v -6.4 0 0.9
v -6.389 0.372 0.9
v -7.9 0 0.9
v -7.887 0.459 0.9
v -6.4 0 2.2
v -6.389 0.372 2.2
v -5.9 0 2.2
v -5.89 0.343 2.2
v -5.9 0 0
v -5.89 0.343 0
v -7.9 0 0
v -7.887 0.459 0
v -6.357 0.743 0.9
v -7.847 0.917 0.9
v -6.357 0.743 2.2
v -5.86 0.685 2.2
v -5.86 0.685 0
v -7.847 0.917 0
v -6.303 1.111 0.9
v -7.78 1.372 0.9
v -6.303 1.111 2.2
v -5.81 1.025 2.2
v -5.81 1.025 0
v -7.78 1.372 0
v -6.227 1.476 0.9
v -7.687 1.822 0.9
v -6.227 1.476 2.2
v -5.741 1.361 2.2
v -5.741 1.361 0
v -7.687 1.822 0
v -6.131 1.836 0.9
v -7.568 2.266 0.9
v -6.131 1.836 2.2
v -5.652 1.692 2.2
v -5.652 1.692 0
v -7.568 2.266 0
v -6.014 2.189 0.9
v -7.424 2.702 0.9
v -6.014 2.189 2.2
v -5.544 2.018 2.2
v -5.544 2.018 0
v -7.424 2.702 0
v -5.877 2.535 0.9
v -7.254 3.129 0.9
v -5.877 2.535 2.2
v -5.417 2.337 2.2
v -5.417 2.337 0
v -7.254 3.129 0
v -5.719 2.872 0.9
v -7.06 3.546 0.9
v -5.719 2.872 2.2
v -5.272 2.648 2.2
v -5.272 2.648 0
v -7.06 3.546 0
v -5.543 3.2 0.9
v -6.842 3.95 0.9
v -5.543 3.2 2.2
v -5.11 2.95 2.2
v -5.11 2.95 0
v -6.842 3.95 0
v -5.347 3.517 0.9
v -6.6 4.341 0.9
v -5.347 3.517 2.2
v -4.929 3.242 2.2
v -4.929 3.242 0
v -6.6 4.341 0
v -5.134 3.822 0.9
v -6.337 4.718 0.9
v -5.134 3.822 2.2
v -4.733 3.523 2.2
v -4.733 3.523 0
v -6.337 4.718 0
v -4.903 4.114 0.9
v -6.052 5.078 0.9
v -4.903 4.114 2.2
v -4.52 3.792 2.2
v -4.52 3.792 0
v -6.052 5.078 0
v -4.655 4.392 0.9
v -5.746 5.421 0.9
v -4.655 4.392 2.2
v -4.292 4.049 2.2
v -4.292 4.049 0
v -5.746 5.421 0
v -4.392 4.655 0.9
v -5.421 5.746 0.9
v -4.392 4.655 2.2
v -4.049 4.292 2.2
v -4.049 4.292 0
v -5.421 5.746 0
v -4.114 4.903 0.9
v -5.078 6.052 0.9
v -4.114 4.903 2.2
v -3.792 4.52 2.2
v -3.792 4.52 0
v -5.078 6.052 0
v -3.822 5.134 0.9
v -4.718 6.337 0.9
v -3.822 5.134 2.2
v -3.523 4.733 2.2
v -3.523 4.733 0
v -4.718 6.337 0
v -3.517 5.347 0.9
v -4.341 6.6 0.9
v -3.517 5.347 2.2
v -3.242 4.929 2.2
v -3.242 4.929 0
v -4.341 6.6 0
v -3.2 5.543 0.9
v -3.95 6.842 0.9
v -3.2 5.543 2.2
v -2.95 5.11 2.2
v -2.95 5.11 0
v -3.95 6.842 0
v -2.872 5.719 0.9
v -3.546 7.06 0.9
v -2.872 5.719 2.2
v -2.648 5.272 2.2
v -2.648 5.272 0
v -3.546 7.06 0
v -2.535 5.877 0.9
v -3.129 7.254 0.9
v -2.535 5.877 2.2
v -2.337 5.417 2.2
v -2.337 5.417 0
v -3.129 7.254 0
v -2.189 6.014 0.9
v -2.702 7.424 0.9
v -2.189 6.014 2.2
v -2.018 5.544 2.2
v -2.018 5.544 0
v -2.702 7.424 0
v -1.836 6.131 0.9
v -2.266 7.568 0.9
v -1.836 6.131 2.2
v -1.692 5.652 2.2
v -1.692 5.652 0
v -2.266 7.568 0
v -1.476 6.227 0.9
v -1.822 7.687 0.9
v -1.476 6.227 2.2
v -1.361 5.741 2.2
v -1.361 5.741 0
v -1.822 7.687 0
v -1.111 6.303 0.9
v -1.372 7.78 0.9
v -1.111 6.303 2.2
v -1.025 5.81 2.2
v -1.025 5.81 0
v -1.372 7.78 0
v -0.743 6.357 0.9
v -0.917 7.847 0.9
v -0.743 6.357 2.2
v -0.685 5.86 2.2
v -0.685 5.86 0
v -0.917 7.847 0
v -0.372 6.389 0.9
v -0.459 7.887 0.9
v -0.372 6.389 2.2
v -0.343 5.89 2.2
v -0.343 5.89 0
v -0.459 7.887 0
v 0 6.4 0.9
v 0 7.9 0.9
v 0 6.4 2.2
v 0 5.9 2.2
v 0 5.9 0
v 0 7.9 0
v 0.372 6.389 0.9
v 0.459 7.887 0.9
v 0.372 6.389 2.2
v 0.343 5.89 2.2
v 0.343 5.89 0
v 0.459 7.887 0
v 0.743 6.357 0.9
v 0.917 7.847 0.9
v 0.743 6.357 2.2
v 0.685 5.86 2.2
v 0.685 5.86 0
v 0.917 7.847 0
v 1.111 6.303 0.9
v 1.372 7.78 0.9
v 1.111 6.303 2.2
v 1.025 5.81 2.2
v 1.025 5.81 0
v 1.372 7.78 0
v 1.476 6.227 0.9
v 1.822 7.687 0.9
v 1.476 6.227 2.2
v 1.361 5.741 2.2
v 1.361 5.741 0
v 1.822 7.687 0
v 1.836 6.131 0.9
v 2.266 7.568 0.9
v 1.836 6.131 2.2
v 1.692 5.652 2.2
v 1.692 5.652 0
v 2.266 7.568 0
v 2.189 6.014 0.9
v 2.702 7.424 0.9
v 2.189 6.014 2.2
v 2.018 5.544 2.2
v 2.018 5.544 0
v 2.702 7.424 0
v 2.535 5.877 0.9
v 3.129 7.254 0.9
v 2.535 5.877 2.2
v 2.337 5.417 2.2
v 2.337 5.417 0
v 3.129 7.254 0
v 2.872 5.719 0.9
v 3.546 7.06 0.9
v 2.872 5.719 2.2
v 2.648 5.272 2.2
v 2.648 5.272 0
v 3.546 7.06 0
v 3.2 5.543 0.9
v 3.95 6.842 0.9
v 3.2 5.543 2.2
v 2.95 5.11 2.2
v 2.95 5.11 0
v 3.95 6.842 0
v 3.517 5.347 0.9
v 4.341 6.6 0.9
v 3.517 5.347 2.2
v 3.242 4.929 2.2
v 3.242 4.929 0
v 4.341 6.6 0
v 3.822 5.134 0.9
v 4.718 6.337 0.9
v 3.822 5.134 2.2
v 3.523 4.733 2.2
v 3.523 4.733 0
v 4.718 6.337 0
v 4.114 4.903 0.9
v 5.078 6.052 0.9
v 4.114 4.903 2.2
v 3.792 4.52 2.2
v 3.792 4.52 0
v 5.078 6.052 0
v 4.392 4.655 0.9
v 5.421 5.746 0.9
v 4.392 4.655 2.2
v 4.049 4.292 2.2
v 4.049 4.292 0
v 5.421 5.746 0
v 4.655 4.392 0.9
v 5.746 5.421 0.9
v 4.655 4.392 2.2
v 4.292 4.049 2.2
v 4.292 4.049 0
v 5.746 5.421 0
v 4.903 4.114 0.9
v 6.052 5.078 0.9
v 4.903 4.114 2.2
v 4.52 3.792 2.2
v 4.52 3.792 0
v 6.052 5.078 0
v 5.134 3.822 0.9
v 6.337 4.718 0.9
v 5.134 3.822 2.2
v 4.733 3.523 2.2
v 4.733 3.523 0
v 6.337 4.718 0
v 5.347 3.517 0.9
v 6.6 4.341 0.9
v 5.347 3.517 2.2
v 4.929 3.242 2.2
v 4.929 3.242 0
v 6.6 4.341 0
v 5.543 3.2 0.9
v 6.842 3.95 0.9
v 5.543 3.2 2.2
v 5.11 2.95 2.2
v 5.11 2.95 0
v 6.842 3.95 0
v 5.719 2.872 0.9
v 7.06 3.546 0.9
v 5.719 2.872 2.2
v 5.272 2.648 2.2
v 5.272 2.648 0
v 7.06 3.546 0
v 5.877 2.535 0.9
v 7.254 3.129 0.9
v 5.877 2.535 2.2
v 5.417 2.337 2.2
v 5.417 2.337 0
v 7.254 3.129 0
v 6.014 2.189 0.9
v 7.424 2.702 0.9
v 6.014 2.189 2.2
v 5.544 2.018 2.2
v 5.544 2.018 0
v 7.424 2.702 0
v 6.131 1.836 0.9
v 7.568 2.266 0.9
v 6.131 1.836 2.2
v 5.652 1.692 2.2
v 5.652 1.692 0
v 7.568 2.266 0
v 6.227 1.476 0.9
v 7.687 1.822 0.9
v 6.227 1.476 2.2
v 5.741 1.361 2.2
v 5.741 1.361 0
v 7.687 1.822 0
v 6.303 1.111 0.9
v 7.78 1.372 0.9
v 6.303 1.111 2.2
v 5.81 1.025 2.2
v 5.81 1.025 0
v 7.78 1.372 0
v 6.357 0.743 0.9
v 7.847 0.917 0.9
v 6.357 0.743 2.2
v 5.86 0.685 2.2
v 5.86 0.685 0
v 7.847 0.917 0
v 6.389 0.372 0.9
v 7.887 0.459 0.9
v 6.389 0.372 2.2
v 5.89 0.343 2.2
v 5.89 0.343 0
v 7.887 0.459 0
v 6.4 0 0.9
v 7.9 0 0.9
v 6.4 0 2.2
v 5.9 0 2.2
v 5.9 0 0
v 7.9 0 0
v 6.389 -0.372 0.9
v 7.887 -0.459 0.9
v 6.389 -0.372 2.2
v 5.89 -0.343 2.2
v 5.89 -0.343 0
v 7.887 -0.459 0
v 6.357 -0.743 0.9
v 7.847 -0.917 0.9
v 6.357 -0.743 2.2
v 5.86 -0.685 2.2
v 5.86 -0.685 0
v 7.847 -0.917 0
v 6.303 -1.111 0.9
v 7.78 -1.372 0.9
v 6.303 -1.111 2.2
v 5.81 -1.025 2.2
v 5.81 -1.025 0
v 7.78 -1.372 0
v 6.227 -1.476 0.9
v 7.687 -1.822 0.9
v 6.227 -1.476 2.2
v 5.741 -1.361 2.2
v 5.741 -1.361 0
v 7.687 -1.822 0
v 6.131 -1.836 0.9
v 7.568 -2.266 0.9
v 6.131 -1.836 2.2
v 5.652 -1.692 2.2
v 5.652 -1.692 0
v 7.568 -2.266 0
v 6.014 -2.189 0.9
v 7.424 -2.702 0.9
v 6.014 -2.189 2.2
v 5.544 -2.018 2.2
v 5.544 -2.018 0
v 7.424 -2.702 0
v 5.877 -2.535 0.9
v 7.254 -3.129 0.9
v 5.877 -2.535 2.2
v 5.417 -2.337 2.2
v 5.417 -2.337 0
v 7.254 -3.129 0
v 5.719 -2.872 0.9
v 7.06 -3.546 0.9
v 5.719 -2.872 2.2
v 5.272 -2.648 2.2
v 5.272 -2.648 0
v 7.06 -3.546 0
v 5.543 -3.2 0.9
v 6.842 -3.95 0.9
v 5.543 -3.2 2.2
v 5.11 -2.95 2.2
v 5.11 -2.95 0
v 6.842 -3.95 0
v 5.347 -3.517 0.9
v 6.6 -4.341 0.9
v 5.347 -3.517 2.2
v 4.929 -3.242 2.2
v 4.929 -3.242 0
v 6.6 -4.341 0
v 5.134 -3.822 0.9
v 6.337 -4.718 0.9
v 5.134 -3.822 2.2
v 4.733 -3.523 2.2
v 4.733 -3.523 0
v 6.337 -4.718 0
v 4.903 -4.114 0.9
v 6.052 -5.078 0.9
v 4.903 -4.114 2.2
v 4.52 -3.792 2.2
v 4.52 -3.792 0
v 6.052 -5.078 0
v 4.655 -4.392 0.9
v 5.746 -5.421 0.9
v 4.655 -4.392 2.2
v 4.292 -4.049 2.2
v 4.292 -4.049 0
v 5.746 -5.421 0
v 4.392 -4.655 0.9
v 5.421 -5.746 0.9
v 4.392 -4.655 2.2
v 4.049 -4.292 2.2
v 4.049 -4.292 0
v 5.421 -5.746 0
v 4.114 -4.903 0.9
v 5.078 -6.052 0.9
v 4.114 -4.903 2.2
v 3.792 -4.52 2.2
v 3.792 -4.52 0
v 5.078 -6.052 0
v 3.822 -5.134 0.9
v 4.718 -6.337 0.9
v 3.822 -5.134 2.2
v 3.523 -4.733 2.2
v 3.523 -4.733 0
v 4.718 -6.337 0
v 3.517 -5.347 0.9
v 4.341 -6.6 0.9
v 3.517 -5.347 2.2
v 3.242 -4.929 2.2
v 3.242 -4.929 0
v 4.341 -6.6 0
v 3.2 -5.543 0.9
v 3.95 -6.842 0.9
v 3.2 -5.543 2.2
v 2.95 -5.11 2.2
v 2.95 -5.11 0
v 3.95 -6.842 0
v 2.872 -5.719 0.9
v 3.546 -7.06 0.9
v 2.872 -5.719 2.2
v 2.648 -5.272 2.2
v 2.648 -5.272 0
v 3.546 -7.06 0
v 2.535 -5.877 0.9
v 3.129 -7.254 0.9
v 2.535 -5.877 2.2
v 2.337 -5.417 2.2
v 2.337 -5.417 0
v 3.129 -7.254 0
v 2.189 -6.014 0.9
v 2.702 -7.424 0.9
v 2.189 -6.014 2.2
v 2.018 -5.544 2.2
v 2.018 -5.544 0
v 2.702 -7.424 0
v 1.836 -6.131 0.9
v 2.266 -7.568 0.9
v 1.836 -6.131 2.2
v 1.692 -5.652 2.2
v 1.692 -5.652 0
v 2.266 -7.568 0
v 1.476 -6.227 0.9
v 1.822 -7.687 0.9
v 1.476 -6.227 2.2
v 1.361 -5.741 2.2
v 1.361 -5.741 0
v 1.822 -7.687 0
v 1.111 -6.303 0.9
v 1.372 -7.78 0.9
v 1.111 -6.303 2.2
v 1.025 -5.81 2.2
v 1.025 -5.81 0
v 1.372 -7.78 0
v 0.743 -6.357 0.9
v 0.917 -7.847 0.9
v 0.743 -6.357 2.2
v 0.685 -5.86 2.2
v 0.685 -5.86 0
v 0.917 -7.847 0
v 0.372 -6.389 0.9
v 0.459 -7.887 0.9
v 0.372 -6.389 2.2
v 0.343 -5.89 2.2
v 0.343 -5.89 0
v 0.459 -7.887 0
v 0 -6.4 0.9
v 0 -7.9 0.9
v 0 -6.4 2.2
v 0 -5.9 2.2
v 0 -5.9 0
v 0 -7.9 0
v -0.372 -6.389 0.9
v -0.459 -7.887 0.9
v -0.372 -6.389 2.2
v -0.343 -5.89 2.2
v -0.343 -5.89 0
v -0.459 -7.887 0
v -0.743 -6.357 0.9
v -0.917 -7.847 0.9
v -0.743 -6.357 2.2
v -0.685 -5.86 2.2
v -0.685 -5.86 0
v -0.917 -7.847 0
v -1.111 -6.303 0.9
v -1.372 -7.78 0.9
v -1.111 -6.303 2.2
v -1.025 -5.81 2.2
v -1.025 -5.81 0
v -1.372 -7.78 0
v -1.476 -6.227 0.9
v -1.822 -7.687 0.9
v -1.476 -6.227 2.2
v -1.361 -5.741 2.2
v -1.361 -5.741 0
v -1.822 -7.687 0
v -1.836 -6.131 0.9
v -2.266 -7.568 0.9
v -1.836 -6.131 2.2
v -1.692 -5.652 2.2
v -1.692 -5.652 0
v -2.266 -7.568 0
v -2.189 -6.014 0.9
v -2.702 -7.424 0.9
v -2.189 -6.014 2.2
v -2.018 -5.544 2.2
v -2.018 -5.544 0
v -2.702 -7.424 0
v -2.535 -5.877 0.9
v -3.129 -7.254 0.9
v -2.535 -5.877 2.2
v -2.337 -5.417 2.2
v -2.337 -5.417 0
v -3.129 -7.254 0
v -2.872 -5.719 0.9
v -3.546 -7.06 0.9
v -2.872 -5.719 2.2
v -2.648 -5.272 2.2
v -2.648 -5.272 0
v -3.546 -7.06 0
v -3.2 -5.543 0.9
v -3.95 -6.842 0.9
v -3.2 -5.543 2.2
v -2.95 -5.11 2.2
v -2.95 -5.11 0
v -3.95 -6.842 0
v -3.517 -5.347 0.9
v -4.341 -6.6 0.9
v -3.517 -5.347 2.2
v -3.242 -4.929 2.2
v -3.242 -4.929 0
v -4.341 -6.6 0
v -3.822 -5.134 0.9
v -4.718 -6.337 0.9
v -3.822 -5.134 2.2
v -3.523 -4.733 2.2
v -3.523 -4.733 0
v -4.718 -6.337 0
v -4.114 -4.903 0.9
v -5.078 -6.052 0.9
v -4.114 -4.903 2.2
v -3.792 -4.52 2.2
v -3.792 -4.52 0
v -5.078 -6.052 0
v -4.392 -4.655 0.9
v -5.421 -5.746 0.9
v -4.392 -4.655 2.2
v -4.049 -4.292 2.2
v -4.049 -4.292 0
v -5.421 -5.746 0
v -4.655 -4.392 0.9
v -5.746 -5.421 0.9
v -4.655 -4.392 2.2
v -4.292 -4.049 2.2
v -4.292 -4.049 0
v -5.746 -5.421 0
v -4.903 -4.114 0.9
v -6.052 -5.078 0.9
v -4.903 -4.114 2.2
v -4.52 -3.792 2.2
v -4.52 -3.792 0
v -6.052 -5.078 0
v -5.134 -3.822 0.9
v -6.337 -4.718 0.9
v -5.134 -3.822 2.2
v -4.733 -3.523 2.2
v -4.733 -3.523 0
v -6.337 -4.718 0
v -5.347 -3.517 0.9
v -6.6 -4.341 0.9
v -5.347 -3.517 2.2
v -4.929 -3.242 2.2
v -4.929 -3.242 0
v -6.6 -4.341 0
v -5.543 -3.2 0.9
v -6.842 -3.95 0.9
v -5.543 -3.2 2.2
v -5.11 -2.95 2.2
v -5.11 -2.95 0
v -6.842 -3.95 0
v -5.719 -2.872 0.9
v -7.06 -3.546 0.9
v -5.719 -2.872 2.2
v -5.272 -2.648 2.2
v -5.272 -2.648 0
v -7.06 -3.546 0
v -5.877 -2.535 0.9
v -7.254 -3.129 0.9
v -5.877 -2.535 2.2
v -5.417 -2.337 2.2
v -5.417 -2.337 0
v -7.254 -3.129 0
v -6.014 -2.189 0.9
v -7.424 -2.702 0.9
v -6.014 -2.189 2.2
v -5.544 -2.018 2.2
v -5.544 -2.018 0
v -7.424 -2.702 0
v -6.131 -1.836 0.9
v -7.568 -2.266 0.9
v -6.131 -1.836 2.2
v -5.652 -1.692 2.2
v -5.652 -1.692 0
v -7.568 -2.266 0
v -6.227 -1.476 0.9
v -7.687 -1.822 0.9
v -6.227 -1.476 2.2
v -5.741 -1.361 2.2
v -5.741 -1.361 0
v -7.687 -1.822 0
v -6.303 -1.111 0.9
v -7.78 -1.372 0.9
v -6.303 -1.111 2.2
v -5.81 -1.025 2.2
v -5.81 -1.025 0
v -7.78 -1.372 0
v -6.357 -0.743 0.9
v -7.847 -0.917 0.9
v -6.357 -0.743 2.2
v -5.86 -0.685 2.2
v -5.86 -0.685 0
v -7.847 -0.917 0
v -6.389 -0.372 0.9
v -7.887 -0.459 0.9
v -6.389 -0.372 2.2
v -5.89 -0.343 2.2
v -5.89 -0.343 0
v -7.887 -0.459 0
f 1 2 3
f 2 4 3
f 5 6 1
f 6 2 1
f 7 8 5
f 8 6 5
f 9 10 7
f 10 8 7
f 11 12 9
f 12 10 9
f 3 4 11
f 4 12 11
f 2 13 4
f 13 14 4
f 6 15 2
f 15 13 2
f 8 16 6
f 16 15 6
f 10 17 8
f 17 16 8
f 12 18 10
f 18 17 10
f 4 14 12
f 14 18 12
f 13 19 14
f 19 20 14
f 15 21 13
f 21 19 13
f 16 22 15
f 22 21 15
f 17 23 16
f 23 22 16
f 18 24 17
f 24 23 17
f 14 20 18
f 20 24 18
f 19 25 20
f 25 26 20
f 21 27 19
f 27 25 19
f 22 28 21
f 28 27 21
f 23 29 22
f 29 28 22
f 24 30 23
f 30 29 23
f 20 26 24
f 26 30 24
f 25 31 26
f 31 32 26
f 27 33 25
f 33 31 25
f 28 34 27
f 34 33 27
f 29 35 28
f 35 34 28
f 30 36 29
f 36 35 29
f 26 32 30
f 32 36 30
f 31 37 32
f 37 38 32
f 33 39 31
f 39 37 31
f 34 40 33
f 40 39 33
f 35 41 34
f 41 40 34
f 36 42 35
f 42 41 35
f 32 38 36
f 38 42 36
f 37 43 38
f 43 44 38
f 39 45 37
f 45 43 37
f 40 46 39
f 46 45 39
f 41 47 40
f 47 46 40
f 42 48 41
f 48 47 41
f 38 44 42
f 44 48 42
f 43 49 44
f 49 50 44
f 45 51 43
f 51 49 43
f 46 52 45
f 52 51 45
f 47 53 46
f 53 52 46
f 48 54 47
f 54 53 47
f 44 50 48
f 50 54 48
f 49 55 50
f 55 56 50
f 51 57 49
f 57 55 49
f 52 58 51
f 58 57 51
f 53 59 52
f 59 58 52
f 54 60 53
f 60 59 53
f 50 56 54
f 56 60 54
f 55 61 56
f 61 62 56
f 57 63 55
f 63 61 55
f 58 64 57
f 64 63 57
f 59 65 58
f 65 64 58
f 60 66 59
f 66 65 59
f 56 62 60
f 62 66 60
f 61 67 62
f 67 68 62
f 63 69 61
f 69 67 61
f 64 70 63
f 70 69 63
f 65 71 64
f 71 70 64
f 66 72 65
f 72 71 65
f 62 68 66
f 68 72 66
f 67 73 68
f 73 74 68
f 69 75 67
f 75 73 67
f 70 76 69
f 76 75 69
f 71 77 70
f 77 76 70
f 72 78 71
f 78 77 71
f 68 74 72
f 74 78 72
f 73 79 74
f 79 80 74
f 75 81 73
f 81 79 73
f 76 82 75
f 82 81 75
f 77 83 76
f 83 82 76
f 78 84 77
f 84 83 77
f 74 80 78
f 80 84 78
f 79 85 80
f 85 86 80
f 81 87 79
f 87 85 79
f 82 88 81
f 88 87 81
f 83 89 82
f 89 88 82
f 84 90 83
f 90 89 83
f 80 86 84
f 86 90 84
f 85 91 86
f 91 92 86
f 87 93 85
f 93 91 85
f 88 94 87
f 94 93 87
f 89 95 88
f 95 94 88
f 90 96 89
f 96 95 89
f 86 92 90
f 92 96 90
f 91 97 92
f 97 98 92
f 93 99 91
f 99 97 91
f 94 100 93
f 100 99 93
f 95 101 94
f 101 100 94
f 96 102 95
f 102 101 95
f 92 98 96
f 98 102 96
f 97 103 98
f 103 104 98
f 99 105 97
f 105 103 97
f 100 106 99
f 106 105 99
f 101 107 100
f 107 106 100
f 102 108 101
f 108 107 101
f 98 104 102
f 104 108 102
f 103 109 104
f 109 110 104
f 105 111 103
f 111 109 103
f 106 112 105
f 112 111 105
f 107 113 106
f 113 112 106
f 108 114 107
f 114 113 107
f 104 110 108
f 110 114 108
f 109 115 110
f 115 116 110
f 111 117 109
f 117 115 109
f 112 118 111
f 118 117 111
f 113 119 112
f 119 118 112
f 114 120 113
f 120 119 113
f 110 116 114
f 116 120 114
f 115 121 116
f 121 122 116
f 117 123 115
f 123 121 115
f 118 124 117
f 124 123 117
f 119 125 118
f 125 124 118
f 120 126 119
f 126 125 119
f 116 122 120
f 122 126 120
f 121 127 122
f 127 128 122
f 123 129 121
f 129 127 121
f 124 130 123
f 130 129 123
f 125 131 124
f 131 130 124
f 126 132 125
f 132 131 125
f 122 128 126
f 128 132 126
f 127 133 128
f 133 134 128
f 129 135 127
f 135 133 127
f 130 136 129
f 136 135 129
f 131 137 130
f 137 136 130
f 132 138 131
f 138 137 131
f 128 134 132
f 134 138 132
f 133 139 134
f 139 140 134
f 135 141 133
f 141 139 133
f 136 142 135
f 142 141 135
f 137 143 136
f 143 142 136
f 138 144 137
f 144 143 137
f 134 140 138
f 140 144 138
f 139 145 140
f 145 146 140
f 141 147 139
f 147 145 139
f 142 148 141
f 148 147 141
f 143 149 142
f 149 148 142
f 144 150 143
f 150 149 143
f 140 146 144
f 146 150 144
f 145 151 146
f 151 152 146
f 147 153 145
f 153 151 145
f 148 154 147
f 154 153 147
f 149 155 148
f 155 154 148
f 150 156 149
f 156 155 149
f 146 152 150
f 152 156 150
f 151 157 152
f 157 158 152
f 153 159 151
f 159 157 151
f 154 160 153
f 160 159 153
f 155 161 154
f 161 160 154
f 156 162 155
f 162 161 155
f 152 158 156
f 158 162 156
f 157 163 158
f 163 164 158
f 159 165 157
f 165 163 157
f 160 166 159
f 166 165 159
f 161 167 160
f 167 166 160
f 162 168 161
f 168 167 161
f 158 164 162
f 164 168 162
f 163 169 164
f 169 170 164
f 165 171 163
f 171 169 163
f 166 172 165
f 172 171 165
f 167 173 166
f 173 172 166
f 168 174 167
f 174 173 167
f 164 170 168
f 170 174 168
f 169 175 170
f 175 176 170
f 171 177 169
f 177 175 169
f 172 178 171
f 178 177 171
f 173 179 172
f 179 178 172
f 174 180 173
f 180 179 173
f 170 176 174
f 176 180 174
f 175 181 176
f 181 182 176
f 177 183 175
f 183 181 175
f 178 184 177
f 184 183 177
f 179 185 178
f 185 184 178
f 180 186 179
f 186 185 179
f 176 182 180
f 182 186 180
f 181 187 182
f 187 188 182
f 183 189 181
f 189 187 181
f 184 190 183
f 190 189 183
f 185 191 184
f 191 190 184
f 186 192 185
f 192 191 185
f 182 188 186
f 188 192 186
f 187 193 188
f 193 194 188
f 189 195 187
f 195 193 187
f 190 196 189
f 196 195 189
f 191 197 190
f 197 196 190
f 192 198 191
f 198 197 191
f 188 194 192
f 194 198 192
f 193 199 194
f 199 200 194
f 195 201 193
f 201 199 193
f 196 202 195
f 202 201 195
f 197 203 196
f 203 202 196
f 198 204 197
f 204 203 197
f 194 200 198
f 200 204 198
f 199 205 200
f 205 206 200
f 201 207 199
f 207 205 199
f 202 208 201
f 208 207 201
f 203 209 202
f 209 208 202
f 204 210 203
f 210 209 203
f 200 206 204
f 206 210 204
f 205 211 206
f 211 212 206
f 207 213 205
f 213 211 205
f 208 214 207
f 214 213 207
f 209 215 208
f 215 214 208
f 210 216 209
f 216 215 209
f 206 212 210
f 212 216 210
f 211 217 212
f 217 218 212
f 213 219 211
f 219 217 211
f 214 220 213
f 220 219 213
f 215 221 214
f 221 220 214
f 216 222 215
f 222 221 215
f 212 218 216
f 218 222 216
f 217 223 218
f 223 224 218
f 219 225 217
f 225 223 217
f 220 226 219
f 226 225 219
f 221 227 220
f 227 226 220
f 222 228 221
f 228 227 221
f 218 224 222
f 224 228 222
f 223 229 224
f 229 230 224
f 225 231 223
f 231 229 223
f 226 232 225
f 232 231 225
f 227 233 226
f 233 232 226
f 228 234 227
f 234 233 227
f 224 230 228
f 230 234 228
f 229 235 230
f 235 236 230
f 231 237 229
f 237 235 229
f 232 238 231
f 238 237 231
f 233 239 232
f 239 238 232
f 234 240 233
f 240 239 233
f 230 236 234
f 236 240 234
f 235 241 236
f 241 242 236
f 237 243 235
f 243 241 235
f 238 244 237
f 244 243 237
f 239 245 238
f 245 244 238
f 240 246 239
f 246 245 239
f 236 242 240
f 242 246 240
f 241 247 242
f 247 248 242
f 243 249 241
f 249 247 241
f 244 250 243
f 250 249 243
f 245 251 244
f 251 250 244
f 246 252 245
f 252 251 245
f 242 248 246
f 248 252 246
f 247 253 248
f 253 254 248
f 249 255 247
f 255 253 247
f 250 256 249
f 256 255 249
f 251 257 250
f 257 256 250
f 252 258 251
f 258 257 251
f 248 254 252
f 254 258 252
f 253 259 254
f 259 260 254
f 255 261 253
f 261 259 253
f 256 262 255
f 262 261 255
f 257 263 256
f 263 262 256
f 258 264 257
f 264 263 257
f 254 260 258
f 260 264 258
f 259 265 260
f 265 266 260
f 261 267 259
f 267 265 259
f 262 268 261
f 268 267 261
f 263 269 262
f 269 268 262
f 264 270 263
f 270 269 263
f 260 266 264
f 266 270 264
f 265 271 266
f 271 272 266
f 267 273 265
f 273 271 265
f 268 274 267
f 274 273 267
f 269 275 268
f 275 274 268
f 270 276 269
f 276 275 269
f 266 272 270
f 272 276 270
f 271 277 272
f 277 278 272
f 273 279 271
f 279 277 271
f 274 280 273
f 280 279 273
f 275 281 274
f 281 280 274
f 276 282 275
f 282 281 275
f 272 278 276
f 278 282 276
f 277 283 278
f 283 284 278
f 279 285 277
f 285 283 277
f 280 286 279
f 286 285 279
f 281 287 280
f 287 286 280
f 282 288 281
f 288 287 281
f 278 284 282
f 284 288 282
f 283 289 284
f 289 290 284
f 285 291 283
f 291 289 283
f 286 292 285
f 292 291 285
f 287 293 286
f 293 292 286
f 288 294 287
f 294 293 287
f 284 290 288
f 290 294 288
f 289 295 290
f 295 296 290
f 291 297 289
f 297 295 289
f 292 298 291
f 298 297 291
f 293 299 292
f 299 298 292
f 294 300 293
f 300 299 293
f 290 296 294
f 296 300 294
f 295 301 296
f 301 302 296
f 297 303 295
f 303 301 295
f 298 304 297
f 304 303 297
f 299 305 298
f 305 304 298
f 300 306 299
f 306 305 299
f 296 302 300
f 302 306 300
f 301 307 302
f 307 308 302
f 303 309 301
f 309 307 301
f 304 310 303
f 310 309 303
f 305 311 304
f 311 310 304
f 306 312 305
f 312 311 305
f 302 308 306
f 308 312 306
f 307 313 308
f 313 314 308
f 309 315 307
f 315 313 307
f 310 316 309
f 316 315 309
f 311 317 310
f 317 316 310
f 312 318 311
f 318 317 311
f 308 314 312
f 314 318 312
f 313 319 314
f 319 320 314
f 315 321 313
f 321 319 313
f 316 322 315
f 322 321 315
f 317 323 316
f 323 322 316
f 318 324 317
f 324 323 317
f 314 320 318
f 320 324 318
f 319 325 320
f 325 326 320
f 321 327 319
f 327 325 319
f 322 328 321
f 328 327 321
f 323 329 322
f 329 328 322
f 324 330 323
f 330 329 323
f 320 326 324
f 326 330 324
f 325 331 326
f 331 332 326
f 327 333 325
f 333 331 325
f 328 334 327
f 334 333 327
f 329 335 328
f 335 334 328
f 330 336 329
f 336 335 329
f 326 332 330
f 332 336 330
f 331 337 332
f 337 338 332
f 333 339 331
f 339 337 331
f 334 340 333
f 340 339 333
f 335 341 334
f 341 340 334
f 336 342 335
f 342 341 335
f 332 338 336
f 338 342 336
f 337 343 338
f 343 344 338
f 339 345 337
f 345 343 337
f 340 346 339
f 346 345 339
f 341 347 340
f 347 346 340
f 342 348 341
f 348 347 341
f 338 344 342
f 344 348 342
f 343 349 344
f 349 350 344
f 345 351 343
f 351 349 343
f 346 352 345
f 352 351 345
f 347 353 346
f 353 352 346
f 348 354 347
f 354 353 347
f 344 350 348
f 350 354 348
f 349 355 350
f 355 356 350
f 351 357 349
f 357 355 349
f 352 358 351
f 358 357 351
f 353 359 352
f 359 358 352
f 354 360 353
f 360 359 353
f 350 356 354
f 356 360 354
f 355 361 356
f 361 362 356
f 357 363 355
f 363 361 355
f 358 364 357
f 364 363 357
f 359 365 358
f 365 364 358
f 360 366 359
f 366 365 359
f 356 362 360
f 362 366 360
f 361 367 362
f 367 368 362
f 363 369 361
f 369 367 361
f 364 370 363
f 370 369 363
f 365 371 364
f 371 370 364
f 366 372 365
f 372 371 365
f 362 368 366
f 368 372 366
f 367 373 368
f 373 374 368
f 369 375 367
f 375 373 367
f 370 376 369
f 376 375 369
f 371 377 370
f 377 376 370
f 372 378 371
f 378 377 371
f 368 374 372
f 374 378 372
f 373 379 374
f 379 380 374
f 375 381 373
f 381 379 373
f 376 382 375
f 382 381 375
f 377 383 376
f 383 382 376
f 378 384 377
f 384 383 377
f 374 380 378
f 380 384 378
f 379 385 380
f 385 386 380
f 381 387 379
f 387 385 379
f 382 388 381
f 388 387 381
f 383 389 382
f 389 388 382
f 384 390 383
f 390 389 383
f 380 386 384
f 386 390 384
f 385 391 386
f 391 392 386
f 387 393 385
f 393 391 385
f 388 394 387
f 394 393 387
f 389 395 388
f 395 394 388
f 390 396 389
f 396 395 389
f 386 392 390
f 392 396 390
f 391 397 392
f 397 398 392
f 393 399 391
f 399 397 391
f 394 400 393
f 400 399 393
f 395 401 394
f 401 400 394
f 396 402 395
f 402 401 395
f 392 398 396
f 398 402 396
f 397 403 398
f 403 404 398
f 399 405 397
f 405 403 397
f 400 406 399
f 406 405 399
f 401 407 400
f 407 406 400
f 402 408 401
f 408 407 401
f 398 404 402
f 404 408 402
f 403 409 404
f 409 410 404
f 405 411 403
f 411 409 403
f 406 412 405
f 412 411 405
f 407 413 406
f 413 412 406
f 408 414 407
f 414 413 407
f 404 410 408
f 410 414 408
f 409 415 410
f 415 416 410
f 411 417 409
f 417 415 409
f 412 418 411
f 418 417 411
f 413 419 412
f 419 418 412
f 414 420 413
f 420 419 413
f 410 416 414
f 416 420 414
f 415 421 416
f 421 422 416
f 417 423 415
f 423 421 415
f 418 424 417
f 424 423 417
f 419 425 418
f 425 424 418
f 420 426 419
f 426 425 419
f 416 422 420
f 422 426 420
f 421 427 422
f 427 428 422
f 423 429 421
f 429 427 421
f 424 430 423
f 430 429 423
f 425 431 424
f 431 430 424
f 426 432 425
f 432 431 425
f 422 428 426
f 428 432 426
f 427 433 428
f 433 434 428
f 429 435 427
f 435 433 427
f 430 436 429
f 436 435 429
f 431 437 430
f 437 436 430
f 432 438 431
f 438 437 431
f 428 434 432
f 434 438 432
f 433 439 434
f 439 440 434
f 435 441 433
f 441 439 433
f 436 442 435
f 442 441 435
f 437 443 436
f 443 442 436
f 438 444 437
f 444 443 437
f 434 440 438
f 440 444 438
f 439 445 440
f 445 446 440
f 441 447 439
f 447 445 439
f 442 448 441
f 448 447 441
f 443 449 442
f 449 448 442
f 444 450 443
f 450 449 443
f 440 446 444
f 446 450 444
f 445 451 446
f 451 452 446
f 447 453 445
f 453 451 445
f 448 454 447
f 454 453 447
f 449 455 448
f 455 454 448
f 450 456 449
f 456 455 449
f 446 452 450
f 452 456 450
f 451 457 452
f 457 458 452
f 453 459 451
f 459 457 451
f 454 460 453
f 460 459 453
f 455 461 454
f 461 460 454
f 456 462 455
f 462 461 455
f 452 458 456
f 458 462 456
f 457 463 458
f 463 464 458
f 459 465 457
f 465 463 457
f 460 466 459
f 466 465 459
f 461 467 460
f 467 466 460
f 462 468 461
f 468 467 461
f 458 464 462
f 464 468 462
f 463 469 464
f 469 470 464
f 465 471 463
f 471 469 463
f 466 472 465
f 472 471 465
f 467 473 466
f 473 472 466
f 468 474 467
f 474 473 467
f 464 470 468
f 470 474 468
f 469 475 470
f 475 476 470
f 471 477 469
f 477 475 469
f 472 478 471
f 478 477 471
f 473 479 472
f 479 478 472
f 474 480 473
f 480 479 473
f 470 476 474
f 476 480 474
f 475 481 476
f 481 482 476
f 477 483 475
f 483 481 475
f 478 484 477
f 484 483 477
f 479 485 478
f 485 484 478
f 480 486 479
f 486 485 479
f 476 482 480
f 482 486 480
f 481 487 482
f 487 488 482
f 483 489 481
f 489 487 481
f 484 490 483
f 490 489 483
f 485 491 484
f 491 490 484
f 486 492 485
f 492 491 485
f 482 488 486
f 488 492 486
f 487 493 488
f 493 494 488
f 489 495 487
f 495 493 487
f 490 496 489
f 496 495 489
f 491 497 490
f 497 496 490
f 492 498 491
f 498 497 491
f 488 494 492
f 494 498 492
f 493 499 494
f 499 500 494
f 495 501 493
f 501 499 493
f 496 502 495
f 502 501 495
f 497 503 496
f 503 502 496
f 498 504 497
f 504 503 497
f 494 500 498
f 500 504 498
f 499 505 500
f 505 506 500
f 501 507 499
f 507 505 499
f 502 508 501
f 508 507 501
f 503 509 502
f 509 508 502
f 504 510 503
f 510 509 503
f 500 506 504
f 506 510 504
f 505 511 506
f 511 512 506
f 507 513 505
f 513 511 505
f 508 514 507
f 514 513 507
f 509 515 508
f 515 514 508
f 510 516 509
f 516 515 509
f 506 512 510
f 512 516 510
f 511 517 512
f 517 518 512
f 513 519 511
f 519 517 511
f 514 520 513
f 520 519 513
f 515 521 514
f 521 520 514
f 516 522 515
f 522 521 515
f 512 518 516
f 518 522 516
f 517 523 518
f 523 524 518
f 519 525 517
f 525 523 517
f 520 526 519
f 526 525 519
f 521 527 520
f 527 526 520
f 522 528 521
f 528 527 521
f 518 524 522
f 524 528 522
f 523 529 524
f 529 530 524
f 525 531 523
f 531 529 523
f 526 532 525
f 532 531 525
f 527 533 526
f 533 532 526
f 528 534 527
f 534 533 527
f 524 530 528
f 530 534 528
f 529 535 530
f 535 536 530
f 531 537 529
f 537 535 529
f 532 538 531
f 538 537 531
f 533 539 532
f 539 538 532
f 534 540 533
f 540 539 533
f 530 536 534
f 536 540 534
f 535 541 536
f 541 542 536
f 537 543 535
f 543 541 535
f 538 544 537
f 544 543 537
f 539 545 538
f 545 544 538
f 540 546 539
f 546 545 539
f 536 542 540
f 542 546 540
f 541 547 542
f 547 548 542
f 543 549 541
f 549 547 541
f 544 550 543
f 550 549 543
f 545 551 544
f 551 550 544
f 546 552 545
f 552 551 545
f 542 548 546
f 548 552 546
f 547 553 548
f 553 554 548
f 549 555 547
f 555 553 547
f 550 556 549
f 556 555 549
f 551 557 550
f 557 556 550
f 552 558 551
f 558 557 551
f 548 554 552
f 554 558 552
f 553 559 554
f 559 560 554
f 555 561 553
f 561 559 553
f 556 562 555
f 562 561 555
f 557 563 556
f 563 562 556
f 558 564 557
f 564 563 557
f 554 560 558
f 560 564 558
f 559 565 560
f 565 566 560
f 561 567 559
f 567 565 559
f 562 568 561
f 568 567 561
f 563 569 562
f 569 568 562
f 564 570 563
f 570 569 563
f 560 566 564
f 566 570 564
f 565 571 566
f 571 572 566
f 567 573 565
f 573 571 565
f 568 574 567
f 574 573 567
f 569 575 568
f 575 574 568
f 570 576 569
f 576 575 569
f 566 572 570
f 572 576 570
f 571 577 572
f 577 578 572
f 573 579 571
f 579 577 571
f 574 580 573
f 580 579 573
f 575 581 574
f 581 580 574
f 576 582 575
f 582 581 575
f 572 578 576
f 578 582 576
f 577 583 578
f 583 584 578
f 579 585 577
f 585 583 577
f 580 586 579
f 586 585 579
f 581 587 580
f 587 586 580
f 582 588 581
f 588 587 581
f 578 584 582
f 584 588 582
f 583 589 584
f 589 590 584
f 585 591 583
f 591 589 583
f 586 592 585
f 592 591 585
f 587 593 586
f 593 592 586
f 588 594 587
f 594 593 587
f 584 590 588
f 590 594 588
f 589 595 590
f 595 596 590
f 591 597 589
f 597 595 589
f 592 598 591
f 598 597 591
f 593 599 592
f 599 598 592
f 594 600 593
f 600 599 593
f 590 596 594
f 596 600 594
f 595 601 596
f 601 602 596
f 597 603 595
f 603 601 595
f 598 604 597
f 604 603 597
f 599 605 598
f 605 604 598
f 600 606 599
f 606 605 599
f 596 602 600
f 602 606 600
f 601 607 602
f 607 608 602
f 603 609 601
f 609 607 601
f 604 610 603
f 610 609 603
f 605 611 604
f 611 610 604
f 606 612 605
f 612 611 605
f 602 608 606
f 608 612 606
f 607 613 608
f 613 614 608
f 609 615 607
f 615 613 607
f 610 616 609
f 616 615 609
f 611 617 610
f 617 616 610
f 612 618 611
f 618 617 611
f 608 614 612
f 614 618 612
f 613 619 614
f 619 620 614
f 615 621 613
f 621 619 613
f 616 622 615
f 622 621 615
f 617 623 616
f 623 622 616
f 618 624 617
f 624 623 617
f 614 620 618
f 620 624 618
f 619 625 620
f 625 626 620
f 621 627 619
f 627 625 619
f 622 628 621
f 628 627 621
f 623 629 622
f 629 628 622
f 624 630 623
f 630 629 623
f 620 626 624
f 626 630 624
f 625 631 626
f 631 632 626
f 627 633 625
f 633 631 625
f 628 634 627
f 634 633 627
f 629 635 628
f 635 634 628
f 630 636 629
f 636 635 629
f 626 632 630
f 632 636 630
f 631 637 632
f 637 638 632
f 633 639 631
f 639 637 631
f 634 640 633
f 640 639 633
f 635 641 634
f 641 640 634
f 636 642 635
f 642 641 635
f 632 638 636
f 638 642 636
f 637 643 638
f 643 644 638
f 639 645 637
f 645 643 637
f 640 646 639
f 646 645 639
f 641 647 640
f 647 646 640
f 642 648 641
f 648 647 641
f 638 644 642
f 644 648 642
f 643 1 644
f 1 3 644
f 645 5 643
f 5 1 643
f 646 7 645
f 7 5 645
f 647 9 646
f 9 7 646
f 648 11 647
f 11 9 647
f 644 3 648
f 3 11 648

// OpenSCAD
//  Characters    Behavior
//     //            ignore, comment
//     $fa           minimum angle
//     *             disable
//     !             show only
//     #             highlight / debug
//     %             transparent / background
// http://www.openscad.org/cheatsheet/index.html

use <MCAD/regular_shapes.scad>

// Globals

convexity = 4;
number_of_fragments = 0.30 * 360;
eps = 0.001;

$fn = number_of_fragments;

nozzle_line_width = 0.4;

inner_diameter = 11.80;
middl_diameter = 11.82;
outer_diameter = 15.80;
washer_height =   0.90;
flange_height =   1.30;

flange_width = (middl_diameter - inner_diameter) / 2;
flange_x = max(nozzle_line_width, flange_width) + 0.10;
echo(flange_x);

flange_profile_in_mm = [

    [ inner_diameter / 2, 0 ],

    [ outer_diameter / 2, 0 ], // new X: washer bottom
    [ outer_diameter / 2, washer_height ], // new Y: washer edge

    [ inner_diameter / 2 + flange_x, washer_height ], // new X: washer top
    [ inner_diameter / 2 + flange_x, washer_height + flange_height ], // new Y: flange edge

    [ inner_diameter / 2, washer_height + flange_height ], // new X: flange top
    [ inner_diameter / 2, 0 ] // new Y: close profile
];

color("red")
rotate_extrude(convexity=convexity)
polygon(points=flange_profile_in_mm);
